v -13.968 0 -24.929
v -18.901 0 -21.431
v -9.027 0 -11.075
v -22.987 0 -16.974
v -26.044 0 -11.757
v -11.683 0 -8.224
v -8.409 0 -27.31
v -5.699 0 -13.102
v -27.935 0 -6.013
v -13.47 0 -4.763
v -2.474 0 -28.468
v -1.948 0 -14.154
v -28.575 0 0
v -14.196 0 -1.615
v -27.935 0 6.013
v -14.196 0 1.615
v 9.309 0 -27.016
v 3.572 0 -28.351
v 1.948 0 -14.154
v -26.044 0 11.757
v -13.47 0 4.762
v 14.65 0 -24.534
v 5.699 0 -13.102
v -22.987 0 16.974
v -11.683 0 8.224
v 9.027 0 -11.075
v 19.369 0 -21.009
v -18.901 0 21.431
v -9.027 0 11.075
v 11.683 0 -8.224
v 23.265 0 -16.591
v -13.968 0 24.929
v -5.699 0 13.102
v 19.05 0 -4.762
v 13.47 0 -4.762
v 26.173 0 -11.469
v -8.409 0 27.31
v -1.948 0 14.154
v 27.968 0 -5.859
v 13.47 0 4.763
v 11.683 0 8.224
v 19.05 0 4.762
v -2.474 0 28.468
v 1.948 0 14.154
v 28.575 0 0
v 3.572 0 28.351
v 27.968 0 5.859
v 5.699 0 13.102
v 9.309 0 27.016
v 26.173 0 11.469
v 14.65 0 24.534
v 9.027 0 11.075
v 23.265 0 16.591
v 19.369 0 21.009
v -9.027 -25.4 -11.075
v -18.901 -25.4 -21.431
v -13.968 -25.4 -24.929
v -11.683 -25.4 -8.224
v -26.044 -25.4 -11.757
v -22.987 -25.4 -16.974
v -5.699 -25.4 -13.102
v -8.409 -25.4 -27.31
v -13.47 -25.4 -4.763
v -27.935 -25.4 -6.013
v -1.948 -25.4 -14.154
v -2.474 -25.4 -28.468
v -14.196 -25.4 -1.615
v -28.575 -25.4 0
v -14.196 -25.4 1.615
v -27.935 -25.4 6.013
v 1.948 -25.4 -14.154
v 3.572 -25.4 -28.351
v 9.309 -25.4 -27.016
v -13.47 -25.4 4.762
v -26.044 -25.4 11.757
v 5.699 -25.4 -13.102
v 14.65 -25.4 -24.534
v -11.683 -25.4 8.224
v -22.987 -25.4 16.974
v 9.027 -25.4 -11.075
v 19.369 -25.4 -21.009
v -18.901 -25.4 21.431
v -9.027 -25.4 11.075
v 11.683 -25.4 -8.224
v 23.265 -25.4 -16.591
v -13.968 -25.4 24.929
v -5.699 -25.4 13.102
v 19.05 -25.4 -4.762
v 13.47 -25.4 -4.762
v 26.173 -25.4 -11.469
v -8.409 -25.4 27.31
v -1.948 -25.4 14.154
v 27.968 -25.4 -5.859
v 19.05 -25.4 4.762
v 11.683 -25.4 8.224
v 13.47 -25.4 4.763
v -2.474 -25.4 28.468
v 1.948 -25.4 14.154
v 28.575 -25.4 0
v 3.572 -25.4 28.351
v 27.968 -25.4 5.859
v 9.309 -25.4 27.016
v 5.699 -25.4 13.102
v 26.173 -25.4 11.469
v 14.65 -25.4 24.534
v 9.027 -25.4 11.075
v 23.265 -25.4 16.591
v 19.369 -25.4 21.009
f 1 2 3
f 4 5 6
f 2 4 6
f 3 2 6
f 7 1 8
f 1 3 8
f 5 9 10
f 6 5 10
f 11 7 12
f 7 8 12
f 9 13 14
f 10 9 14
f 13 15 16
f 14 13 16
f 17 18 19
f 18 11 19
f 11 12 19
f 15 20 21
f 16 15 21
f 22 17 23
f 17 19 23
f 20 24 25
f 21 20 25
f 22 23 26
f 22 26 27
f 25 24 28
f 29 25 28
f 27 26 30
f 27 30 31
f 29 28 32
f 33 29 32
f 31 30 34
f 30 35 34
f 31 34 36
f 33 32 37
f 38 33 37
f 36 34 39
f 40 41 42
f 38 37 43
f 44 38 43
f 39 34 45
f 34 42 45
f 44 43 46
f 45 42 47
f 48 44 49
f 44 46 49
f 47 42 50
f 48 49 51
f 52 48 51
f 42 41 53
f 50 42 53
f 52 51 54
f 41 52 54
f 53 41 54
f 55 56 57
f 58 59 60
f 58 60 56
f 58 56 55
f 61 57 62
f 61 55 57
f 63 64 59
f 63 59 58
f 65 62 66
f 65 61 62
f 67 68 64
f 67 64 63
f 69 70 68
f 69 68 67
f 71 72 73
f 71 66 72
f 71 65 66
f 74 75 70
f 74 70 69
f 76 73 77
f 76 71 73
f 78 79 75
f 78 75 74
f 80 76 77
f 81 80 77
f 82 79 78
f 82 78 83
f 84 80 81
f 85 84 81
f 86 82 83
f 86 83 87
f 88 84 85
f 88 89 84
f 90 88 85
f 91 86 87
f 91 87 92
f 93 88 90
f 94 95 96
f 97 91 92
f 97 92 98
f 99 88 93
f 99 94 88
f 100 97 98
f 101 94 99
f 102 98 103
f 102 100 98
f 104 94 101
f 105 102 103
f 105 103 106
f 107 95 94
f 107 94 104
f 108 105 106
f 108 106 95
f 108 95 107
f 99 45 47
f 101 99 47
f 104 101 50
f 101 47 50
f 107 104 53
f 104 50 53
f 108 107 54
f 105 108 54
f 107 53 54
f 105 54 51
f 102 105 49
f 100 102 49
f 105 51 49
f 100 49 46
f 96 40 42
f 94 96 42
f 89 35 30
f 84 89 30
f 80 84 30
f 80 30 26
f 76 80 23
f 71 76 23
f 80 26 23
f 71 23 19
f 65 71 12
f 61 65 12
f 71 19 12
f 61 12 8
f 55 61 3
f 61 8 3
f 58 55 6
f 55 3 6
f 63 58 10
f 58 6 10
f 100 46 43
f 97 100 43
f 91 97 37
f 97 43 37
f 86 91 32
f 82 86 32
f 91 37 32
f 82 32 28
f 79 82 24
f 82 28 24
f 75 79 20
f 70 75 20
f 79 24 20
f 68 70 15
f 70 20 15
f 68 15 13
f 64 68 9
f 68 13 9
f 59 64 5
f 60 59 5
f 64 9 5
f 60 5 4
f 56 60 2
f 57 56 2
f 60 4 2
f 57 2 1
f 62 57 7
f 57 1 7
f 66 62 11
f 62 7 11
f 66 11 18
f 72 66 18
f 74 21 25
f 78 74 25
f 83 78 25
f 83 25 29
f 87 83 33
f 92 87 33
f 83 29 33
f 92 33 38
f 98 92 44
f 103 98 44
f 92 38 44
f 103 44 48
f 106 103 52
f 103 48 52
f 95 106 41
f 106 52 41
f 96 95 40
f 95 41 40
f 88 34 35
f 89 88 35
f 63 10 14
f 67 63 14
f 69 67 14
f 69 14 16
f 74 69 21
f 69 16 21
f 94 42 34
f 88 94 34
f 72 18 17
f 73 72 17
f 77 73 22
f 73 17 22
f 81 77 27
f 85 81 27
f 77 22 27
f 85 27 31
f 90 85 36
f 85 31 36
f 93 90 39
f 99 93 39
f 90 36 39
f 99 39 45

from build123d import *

# Parameters (mm, degrees)
F1_DEPTH = 25.4


with BuildPart() as f1:
    # F0 (on Front) → F1 (new body)
    with BuildSketch(Plane.XZ):
        with BuildLine():
            ThreePointArc((3.571875, -28.350879), (21.43125, -18.900586), (28.575, 0))
            ThreePointArc((28.575, 0), (21.43125, 18.900586), (3.571875, 28.350879))
            ThreePointArc((3.571875, 28.350879), (-28.575, 0), (3.571875, -28.350879))
        make_face()
        with BuildLine():
            ThreePointArc((-13.470384, 4.7625), (0, 14.2875), (13.470384, 4.7625))
            Line((13.470384, 4.7625), (19.05, 4.7625))
            Line((19.05, 4.7625), (19.05, -4.7625))
            Line((19.05, -4.7625), (13.470384, -4.7625))
            ThreePointArc((13.470384, -4.7625), (0, -14.2875), (-13.470384, -4.7625))
            Line((-13.470384, -4.7625), (-19.05, -4.7625))
            Line((-19.05, -4.7625), (-19.05, 4.7625))
            Line((-19.05, 4.7625), (-13.470384, 4.7625))
        make_face(mode=Mode.SUBTRACT)
        with BuildLine():
            ThreePointArc((-13.470384, -4.7625), (-14.2875, 0), (-13.470384, 4.7625))
            Line((-13.470384, 4.7625), (-19.05, 4.7625))
            Line((-19.05, 4.7625), (-19.05, -4.7625))
            Line((-19.05, -4.7625), (-13.470384, -4.7625))
        make_face()
    extrude(amount=F1_DEPTH)


solid = f1.part
